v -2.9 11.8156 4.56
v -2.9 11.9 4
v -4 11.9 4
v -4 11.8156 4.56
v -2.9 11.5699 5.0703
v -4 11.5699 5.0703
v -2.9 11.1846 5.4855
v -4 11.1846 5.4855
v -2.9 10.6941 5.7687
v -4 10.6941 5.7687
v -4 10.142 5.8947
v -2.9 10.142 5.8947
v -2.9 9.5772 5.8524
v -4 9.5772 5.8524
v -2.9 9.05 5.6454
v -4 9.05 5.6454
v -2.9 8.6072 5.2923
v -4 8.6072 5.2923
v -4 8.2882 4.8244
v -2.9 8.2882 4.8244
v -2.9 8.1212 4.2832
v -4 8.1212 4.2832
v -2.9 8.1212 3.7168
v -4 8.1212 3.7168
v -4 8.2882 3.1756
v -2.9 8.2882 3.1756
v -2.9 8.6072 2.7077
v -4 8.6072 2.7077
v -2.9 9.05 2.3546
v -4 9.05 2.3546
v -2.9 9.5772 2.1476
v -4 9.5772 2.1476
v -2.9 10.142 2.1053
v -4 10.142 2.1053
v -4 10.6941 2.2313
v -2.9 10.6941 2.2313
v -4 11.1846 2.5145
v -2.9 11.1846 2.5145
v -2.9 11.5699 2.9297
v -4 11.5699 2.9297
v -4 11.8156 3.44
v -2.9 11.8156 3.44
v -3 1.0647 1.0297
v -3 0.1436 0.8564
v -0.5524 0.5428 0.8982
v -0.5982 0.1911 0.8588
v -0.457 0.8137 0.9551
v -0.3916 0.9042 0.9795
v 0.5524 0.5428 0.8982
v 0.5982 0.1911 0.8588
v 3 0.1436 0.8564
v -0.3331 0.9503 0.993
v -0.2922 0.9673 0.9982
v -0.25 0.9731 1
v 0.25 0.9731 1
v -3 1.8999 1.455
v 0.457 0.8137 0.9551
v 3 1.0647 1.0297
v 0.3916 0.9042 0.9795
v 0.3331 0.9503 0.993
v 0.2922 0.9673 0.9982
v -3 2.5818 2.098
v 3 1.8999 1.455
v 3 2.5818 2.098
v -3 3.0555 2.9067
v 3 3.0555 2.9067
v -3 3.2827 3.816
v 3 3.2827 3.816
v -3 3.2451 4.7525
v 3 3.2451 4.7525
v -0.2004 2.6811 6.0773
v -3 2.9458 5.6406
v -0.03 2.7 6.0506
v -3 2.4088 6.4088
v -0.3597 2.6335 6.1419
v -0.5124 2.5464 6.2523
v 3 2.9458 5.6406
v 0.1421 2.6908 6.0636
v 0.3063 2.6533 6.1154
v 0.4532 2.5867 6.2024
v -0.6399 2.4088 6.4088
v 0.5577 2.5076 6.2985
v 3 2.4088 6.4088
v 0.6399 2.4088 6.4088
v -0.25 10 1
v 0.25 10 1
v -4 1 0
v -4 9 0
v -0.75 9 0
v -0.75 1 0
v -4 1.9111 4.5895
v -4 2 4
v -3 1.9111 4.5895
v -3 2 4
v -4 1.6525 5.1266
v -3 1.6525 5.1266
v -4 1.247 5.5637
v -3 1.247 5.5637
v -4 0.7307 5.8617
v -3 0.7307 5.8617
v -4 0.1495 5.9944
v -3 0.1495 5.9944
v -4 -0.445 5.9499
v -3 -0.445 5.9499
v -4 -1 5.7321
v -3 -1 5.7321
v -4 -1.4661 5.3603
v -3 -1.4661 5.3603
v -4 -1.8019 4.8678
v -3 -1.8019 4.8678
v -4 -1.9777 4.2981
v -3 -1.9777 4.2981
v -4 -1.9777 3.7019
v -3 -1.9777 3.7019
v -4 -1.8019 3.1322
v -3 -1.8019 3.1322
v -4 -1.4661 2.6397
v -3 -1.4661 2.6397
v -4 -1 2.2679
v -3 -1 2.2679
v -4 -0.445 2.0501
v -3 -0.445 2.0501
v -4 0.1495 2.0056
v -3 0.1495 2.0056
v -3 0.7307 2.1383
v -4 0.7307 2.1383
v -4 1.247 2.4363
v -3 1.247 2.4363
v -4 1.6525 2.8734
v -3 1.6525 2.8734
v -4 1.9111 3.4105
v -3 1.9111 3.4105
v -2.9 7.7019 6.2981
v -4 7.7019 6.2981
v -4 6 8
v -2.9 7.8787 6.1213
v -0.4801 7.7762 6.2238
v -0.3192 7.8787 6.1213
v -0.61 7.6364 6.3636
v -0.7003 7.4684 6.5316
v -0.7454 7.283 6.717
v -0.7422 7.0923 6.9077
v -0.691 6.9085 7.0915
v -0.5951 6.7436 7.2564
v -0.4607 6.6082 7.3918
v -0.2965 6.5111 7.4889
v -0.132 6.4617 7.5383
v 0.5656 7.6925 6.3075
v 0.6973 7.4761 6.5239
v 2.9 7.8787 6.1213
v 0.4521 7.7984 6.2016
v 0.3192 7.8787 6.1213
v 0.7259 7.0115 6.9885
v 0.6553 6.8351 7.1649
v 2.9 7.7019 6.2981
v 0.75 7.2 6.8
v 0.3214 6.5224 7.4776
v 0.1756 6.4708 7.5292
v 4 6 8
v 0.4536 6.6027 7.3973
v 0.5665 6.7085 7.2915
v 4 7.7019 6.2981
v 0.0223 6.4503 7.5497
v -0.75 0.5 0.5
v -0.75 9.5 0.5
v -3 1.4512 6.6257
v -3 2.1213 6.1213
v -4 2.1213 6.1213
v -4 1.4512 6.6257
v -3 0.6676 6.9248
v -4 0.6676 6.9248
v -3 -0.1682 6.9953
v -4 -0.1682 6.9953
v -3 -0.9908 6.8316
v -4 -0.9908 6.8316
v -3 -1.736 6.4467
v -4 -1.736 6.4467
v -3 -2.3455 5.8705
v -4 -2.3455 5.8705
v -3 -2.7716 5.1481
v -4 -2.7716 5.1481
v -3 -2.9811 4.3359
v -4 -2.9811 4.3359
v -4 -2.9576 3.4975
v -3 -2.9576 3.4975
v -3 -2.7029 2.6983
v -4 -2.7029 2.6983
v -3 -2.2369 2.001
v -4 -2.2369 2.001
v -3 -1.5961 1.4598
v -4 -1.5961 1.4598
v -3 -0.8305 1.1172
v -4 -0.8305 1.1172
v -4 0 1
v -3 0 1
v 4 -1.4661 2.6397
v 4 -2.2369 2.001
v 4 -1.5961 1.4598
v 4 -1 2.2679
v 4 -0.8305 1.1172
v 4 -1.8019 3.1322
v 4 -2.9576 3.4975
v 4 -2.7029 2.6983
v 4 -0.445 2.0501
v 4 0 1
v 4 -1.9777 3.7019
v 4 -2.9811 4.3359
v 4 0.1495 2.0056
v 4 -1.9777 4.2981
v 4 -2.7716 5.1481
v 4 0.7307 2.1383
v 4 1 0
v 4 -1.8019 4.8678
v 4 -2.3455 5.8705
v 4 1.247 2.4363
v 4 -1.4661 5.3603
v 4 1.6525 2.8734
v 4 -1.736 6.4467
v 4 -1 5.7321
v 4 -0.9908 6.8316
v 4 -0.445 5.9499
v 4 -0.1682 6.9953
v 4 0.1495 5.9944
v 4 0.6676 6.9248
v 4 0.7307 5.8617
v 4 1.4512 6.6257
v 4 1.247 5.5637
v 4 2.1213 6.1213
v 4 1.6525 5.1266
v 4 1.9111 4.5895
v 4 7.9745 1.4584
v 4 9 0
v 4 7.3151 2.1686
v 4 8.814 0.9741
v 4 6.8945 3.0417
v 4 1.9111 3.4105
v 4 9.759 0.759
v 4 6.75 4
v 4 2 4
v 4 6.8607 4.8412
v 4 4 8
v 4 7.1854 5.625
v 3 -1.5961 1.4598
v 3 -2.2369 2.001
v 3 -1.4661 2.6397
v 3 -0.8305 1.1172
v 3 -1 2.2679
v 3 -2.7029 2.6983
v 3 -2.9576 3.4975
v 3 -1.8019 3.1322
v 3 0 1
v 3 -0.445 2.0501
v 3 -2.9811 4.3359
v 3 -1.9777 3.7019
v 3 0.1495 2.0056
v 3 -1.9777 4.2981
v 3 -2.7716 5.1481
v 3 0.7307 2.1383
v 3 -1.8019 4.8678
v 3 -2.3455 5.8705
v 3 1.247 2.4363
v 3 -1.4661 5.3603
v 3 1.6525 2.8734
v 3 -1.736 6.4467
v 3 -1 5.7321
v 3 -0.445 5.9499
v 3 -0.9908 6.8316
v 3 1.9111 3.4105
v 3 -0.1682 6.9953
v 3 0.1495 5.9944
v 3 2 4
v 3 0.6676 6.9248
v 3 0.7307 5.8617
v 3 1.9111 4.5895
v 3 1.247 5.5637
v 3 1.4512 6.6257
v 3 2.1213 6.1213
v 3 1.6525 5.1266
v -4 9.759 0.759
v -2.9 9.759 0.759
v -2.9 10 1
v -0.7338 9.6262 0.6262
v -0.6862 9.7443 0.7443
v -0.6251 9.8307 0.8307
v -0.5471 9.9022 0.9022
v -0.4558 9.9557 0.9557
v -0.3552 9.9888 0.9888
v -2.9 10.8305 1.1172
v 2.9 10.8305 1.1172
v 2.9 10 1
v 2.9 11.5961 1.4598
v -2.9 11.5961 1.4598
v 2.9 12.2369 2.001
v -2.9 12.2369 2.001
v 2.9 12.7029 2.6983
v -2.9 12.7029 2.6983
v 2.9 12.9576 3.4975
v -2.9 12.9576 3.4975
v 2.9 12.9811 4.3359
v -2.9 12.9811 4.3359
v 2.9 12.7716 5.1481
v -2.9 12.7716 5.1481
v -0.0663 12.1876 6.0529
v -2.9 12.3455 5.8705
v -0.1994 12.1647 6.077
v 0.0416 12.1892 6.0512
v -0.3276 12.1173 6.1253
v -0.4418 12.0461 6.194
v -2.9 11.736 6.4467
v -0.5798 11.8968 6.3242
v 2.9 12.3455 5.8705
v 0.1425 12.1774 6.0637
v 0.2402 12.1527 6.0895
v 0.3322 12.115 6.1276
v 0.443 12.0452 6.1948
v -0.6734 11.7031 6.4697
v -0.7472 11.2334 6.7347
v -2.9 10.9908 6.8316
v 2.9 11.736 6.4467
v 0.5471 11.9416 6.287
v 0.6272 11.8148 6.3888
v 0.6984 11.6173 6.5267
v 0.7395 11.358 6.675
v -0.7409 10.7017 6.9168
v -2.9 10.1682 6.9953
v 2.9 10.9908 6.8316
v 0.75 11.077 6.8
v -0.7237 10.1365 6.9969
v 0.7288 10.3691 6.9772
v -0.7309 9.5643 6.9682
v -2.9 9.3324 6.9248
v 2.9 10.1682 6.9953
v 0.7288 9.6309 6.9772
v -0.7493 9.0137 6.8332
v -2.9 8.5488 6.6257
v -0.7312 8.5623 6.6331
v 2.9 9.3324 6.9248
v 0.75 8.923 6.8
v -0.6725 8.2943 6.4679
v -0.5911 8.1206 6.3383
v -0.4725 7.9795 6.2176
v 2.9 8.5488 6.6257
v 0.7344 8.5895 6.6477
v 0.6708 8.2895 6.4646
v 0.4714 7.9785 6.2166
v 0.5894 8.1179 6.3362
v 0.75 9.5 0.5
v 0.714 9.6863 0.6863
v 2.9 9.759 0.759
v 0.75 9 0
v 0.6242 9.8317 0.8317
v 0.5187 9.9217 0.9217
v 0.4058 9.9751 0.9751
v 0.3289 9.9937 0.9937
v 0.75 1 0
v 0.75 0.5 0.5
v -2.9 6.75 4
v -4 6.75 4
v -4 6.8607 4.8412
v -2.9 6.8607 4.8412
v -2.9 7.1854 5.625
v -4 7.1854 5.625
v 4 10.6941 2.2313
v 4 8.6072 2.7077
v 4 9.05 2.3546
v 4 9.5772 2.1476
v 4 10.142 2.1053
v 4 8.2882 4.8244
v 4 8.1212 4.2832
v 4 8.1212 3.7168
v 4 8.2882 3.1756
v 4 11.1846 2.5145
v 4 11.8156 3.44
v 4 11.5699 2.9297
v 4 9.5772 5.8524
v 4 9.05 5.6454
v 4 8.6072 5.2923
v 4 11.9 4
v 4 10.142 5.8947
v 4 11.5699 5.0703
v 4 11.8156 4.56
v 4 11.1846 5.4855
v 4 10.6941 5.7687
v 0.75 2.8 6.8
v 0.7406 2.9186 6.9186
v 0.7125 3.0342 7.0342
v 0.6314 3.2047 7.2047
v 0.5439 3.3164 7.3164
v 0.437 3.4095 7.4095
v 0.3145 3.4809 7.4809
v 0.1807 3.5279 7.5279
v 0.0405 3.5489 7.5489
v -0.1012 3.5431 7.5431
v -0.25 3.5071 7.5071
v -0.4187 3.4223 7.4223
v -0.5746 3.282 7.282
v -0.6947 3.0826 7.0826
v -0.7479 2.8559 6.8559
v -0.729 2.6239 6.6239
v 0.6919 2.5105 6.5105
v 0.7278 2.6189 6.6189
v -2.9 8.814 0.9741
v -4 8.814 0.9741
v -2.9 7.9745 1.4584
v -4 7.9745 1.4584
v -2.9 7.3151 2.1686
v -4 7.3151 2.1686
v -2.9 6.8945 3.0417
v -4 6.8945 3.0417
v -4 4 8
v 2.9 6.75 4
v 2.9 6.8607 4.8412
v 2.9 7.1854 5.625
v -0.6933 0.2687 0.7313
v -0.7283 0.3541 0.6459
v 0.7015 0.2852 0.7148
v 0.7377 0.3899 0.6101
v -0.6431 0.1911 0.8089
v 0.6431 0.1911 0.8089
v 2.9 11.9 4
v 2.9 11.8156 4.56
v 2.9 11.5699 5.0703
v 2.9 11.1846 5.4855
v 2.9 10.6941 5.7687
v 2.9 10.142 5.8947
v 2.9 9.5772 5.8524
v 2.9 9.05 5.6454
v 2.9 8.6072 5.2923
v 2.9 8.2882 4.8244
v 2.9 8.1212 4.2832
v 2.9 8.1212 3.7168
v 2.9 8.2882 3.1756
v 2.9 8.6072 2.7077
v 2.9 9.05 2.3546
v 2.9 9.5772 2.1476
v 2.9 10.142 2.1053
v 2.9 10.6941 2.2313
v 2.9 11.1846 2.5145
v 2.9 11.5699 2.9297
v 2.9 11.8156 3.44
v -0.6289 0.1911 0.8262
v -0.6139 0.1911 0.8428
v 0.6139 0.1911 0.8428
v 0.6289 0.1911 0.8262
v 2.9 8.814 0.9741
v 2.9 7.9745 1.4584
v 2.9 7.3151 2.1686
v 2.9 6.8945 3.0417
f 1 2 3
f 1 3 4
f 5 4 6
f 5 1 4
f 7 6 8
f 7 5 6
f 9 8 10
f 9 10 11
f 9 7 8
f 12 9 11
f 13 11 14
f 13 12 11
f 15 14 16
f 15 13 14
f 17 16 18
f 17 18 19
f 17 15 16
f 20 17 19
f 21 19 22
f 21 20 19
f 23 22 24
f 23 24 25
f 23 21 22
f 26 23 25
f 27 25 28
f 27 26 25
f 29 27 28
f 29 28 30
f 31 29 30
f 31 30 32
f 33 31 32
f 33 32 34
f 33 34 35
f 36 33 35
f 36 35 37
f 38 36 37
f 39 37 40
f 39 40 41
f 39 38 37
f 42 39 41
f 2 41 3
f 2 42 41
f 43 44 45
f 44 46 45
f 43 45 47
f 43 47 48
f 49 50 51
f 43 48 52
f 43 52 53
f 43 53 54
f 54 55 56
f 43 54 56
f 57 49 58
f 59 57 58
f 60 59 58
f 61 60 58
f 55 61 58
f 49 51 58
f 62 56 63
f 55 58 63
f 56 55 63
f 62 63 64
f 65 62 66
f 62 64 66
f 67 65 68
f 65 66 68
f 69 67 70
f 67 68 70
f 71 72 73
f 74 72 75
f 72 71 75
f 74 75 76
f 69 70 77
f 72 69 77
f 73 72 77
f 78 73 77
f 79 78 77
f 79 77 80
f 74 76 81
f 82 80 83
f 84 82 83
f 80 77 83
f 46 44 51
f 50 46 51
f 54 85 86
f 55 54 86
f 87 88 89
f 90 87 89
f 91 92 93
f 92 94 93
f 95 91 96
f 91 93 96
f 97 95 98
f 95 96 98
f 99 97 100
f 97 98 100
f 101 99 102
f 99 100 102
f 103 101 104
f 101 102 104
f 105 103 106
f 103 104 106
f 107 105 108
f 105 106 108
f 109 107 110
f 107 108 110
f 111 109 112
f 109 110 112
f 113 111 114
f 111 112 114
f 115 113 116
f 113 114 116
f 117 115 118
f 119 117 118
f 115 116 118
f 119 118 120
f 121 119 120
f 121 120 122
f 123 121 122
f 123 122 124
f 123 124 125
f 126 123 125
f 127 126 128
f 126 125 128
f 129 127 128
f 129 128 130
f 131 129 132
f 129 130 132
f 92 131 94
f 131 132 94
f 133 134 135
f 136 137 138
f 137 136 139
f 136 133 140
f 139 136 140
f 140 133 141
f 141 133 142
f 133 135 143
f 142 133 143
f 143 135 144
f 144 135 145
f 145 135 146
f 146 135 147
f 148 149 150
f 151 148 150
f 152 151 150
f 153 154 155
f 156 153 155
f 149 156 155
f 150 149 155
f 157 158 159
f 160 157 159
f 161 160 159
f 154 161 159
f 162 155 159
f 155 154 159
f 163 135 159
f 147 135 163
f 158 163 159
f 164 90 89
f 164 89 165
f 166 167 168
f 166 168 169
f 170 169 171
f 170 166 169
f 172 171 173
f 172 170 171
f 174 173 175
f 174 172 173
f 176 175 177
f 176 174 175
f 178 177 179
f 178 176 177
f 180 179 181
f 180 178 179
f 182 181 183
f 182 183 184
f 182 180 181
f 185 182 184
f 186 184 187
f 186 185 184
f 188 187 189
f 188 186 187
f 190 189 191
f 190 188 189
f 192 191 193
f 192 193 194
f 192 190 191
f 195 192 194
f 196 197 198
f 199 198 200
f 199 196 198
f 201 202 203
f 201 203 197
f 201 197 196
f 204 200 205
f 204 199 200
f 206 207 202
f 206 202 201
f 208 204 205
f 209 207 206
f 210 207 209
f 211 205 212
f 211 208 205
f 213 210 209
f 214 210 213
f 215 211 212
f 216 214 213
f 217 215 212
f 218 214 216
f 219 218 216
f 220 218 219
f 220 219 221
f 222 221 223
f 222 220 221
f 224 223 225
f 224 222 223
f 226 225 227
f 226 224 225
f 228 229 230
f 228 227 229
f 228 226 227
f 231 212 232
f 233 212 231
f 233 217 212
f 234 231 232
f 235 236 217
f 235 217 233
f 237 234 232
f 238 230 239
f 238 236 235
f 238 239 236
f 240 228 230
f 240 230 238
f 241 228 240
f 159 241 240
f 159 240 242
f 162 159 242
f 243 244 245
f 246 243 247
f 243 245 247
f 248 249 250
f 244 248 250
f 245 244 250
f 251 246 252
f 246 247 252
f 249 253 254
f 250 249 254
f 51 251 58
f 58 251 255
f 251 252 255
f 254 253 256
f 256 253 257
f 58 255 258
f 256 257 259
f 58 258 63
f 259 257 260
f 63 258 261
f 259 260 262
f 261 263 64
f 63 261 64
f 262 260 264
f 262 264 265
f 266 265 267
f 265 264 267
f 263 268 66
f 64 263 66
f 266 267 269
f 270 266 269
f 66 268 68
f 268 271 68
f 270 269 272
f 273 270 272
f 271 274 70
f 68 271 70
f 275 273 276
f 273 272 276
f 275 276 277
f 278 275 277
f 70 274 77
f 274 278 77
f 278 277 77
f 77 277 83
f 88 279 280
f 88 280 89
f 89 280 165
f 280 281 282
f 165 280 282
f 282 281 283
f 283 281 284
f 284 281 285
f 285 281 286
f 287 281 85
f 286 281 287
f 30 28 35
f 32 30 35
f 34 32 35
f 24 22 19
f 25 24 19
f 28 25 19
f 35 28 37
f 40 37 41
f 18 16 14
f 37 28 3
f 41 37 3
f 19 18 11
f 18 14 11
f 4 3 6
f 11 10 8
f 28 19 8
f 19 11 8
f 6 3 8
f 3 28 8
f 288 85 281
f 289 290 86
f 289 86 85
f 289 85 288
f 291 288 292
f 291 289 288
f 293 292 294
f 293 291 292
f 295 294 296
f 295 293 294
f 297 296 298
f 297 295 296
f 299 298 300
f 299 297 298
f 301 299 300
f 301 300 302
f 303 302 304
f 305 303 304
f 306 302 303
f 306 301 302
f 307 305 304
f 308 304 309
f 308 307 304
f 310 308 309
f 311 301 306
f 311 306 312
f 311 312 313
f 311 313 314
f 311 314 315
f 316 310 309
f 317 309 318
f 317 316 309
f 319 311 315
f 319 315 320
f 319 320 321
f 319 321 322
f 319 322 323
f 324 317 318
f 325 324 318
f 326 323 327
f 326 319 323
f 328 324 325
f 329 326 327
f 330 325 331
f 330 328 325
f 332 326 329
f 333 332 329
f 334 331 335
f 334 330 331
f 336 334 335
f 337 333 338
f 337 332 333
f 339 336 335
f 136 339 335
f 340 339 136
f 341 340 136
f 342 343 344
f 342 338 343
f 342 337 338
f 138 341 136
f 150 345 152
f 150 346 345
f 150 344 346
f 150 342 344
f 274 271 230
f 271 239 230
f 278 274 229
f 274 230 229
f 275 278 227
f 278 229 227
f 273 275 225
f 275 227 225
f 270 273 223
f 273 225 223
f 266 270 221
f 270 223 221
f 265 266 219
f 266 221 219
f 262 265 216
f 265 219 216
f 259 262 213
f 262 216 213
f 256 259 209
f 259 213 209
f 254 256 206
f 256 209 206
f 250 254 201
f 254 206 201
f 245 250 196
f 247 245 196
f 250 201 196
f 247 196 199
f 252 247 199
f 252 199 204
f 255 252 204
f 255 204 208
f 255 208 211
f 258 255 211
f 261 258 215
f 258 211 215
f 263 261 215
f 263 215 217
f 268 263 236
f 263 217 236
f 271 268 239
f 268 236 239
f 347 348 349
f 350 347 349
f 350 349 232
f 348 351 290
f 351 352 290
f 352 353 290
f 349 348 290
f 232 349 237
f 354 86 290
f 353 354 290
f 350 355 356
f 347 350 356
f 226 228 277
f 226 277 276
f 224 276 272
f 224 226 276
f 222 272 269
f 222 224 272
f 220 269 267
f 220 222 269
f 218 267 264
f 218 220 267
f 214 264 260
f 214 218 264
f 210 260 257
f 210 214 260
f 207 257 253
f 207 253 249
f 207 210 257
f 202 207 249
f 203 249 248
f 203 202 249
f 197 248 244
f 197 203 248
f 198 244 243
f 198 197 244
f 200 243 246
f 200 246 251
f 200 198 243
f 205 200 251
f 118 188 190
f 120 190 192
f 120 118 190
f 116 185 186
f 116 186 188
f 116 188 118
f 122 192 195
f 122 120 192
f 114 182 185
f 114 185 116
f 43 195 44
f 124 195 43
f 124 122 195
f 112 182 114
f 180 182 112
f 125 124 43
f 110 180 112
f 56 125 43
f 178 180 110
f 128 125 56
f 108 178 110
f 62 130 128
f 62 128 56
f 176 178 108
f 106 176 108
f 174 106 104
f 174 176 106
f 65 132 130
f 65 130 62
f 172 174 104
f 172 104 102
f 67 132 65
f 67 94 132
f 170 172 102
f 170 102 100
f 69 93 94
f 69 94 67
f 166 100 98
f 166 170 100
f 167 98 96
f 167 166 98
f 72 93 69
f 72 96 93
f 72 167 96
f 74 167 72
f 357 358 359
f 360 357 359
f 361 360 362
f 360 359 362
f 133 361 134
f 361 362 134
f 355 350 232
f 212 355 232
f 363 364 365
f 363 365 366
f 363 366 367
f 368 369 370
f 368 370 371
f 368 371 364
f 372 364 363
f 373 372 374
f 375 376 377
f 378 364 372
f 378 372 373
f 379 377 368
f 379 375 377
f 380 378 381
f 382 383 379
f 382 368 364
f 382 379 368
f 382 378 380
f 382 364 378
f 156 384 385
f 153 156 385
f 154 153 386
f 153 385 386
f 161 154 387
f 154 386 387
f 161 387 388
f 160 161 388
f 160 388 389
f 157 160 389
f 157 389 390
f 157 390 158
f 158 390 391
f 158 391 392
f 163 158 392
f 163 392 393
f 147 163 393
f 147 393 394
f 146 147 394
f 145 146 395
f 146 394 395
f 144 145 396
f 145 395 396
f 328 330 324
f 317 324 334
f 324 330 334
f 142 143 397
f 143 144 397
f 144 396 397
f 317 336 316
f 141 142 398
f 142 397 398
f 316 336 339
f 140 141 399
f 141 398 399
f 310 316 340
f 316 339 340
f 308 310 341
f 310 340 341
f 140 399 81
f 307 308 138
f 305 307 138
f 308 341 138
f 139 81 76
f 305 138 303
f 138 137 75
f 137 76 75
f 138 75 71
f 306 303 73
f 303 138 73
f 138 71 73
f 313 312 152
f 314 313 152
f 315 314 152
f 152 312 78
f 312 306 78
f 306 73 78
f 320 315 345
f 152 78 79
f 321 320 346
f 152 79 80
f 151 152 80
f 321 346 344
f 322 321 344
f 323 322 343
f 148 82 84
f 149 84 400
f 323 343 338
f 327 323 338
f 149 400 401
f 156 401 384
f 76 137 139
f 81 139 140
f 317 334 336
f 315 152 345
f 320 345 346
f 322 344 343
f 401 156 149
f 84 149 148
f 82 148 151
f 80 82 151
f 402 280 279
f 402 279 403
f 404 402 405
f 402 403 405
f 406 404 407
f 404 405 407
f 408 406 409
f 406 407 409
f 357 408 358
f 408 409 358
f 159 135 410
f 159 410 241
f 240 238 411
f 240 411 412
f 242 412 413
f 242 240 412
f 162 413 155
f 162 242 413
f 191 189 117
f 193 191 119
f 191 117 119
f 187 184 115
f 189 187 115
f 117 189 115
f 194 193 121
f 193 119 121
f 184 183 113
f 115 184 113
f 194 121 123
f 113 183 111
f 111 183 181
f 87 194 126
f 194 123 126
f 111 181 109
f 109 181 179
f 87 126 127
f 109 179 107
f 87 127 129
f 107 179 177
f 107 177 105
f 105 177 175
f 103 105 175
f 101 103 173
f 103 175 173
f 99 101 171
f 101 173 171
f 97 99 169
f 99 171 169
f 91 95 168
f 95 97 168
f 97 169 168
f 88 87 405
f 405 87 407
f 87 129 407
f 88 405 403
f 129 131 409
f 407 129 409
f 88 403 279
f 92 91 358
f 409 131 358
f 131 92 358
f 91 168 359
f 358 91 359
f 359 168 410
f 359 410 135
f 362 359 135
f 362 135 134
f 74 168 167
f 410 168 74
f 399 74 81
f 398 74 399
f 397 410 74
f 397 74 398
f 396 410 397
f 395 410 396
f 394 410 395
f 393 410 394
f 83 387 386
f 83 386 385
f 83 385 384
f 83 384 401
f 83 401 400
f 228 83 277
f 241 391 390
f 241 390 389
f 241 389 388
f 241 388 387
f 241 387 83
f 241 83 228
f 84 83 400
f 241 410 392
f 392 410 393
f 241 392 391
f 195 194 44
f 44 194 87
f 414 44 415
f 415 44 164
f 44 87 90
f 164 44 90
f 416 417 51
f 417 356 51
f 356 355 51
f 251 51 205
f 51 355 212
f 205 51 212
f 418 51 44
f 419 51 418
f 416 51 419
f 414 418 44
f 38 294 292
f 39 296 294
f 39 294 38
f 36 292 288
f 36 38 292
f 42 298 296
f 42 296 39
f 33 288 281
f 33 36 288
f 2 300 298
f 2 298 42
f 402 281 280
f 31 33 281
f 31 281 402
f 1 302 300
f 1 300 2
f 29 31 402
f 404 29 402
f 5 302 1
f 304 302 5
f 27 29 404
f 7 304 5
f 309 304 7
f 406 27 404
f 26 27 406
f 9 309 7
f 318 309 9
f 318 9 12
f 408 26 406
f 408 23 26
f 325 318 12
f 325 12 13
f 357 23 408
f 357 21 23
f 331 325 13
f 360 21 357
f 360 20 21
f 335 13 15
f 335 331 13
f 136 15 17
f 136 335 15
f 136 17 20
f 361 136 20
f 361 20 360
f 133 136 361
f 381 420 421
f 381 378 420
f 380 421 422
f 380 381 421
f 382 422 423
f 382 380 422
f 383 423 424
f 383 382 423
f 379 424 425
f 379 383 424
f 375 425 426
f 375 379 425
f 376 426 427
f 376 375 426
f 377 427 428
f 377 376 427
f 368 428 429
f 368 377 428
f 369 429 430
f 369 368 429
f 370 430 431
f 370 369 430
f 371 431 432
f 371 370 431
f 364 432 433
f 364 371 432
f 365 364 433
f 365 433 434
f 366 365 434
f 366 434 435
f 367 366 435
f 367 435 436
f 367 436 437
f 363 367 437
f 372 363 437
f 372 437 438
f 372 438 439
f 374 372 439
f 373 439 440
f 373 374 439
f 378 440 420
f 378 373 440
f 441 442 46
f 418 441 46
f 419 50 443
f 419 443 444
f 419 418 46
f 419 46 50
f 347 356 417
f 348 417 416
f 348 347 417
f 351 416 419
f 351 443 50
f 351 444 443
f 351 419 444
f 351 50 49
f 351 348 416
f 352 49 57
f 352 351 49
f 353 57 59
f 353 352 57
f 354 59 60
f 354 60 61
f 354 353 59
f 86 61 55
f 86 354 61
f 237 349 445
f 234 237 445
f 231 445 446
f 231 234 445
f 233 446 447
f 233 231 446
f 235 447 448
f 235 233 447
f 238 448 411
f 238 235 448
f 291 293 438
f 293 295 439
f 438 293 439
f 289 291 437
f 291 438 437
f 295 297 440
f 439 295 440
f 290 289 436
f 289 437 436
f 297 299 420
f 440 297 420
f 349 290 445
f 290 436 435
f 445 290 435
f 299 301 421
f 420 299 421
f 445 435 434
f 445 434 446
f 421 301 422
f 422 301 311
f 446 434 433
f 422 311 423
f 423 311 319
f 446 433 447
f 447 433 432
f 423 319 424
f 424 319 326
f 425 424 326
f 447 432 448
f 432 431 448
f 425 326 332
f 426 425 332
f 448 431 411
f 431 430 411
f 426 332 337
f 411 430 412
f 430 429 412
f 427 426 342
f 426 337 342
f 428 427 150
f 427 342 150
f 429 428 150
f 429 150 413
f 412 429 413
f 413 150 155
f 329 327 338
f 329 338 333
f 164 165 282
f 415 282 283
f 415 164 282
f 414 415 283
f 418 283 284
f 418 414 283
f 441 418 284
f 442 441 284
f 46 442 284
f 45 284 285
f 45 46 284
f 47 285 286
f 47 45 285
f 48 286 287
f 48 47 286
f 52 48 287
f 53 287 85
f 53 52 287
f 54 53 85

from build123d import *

# Parameters (mm, degrees)
F0_W          = 8
F0_H          = 10
F1_DEPTH      = 8
F2_SIZE       = 4
F4_DEPTH      = 4
F5_DEPTH      = 3
F6_R          = 3.3
F7_DEPTH      = 3
F9_DEPTH      = 1.1
F11_R         = 1.9
F12_DEPTH     = 4
F13_R         = 2
F14_DEPTH     = 12.5
F15_T1_DEPTH  = 13.1433659759
F15_T6_DEPTH  = 13.1433659759
F15_S7_R      = 3
F15_T8_DEPTH  = 8
F16_W         = 1.5
F16_H         = 1.0667801354
F16_H_2       = 8
F16_H_3       = 0.8089432385
F17_DEPTH     = 1
F18_T4_DEPTH  = 11.5268513298
F18_S7_R      = 3.3
F18_T8_DEPTH  = 7
F18_T12_DEPTH = 11.5268513298
F18_S14_R     = 3.3
F18_T15_DEPTH = 7
F19_R         = 0.75
F20_DEPTH     = 25


# Not quite as in the source:
# - a fillet or chamfer that OpenCascade refuses, or shapes differently, is made with other operations: its cross-section is extruded or revolved along the edge and cut away or added


with BuildPart() as f1:
    # F0 (on Top) → F1 (new body)
    with BuildSketch(Plane.XY):
        with Locations((0, 5)):
            Rectangle(F0_W, F0_H)
    extrude(amount=F1_DEPTH)

    # F2
    f2_edges = [f1.edges().sort_by_distance(p)[0] for p in [
        (0, 0, 8),
        (0, 10, 8),
    ]]
    chamfer(f2_edges, length=F2_SIZE)

    # F3 (on Right) → F4 (join, symmetric)
    with BuildSketch(Plane.YZ):
        with BuildLine():
            ThreePointArc((2.1213203436, 6.1213203436), (-2.7716385975, 5.1480502971), (0, 1))
            Line((0, 1), (0, 4))
            Line((0, 4), (2.1213203436, 6.1213203436))
        make_face()
    extrude(amount=F4_DEPTH, both=True)

    # F3 (on Right) → F5 (join, symmetric)
    with BuildSketch(Plane.YZ):
        with BuildLine():
            Line((10, 4), (10, 1))
            ThreePointArc((10, 1), (12.1213203436, 1.8786796564), (13, 4))
            ThreePointArc((13, 4), (11.1480502971, 6.7716385975), (7.8786796564, 6.1213203436))
            Line((7.8786796564, 6.1213203436), (10, 4))
        make_face()
    extrude(amount=F5_DEPTH, both=True)

    # F6 (on Right) → F7 (cut, symmetric)
    with BuildSketch(Plane.YZ):
        with Locations((0, 4.1532493821)):
            Circle(F6_R)
    extrude(amount=F7_DEPTH, both=True, mode=Mode.SUBTRACT)

    # F8 (on face) → F9 (cut)
    with BuildSketch(Plane(origin=(-4, 0, 0), x_dir=(0, -1, 0), z_dir=(-1, 0, 0))):
        with BuildLine():
            Line((-10, 4), (-7.7019029611, 6.2980970389))
            ThreePointArc((-7.7019029611, 6.2980970389), (-13.0026084807, 5.2437211552), (-10, 0.75))
            Line((-10, 0.75), (-10, 4))
        make_face()
        with BuildLine():
            ThreePointArc((-10, 0.75), (-7.7019029611, 1.7019029611), (-6.75, 4))
            ThreePointArc((-6.75, 4), (-6.9973915193, 5.2437211552), (-7.7019029611, 6.2980970389))
            Line((-7.7019029611, 6.2980970389), (-10, 4))
            Line((-10, 4), (-10, 0.75))
        make_face()
    extrude(amount=-F9_DEPTH, mode=Mode.SUBTRACT)

    # F10: F1 across plane


with BuildPart() as f1_1:
    add(f1.part)
    add(f1.part.mirror(Plane.YZ), mode=Mode.INTERSECT)

    # F11 (on Right) → F12 (join, symmetric)
    with BuildSketch(Plane.YZ):
        with Locations((10, 4)):
            Circle(F11_R)
    extrude(amount=F12_DEPTH, both=True)

    # F13 (on Right) → F14 (cut, symmetric)
    with BuildSketch(Plane.YZ):
        with Locations((0, 4)):
            Circle(F13_R)
    extrude(amount=F14_DEPTH, both=True, mode=Mode.SUBTRACT)

    # F15: chamfer of 1 on 2 edges, made by hand

    # F15_s2 → F15_t1 (cut)
    with BuildSketch(Plane.YZ.offset(-6.571682988)):
        Polygon((1, 0), (0, 1), (0, 0), align=None)
    extrude(amount=F15_T1_DEPTH, mode=Mode.SUBTRACT)


with BuildPart() as f15_tool4:
    # F15_s5 → F15_t6 (new body)
    with BuildSketch(Plane.YZ.offset(6.571682988)):
        Polygon((9, 0), (10, 1), (10, 0), align=None)
    extrude(amount=-F15_T6_DEPTH)

    # F15_s7 → F15_t8 (cut, symmetric)
    with BuildSketch(Plane.YZ):
        with Locations((10, 4)):
            Circle(F15_S7_R)
    extrude(amount=F15_T8_DEPTH, both=True, mode=Mode.SUBTRACT)


with BuildPart() as f1_2:
    add(f1_1.part)

    # F15_t3: cut F15_tool4
    add(f15_tool4.part, mode=Mode.SUBTRACT)

    # F16 (on face) → F17 (cut)
    with BuildSketch(Plane(origin=(0, 0, 0), x_dir=(1, 0, 0), z_dir=(0, 0, -1))):
        with Locations((0, -9.5333900677)):
            Rectangle(F16_W, F16_H)
        with Locations((0, -5)):
            Rectangle(F16_W, F16_H_2)
        with Locations((0, -0.5955283808)):
            Rectangle(F16_W, F16_H_3)
    extrude(amount=-F17_DEPTH, mode=Mode.SUBTRACT)

    # F18: fillet of radius 0.5 on 2 edges, made by hand


with BuildPart() as f18_tool2:
    # F18_s3 → F18_t4 (new body)
    with BuildSketch(Plane.XZ.offset(0.2768513298)):
        with BuildLine():
            ThreePointArc((-0.75, 0.5), (-0.6035533906, 0.8535533906), (-0.25, 1))
            Line((-0.25, 1), (-0.75, 1))
            Line((-0.75, 1), (-0.75, 0.5))
        make_face()
    extrude(amount=-F18_T4_DEPTH)

    split(bisect_by=Plane(origin=(0, 0.5, 0.5), x_dir=(1, 0, 0), z_dir=(0, 0.7071067812, 0.7071067812)), keep=Keep.TOP)

    split(bisect_by=Plane(origin=(0, 4.5, -4.5), x_dir=(1, 0, 0), z_dir=(0, -0.7071067812, 0.7071067812)), keep=Keep.TOP)

    # F18_s7 → F18_t8 (cut, symmetric)
    with BuildSketch(Plane.YZ.offset(-0.5)):
        with Locations((0, 4.1532493821)):
            Circle(F18_S7_R)
    extrude(amount=F18_T8_DEPTH, both=True, mode=Mode.SUBTRACT)


with BuildPart() as f1_3:
    add(f1_2.part)

    # F18_t1: union F18_tool2
    add(f18_tool2.part)


with BuildPart() as f18_tool10:
    # F18_s11 → F18_t12 (new body)
    with BuildSketch(Plane.XZ.offset(-11.25)):
        with BuildLine():
            ThreePointArc((0.75, 0.5), (0.6035533906, 0.8535533906), (0.25, 1))
            Line((0.25, 1), (0.75, 1))
            Line((0.75, 1), (0.75, 0.5))
        make_face()
    extrude(amount=F18_T12_DEPTH)

    split(bisect_by=Plane(origin=(0, 0.5, 0.5), x_dir=(1, 0, 0), z_dir=(0, 0.7071067812, 0.7071067812)), keep=Keep.TOP)

    # F18_s14 → F18_t15 (cut, symmetric)
    with BuildSketch(Plane.YZ.offset(0.5)):
        with Locations((0, 4.1532493821)):
            Circle(F18_S14_R)
    extrude(amount=F18_T15_DEPTH, both=True, mode=Mode.SUBTRACT)

    split(bisect_by=Plane(origin=(0, 4.5, -4.5), x_dir=(1, 0, 0), z_dir=(0, -0.7071067812, 0.7071067812)), keep=Keep.TOP)


with BuildPart() as f1_4:
    add(f1_3.part)

    # F18_t9: union F18_tool10
    add(f18_tool10.part)

    # F19 (on Front) → F20 (cut)
    with BuildSketch(Plane.XZ):
        with Locations((0, 6.8)):
            Circle(F19_R)
    extrude(amount=-F20_DEPTH, mode=Mode.SUBTRACT)


solid = f1_4.part
